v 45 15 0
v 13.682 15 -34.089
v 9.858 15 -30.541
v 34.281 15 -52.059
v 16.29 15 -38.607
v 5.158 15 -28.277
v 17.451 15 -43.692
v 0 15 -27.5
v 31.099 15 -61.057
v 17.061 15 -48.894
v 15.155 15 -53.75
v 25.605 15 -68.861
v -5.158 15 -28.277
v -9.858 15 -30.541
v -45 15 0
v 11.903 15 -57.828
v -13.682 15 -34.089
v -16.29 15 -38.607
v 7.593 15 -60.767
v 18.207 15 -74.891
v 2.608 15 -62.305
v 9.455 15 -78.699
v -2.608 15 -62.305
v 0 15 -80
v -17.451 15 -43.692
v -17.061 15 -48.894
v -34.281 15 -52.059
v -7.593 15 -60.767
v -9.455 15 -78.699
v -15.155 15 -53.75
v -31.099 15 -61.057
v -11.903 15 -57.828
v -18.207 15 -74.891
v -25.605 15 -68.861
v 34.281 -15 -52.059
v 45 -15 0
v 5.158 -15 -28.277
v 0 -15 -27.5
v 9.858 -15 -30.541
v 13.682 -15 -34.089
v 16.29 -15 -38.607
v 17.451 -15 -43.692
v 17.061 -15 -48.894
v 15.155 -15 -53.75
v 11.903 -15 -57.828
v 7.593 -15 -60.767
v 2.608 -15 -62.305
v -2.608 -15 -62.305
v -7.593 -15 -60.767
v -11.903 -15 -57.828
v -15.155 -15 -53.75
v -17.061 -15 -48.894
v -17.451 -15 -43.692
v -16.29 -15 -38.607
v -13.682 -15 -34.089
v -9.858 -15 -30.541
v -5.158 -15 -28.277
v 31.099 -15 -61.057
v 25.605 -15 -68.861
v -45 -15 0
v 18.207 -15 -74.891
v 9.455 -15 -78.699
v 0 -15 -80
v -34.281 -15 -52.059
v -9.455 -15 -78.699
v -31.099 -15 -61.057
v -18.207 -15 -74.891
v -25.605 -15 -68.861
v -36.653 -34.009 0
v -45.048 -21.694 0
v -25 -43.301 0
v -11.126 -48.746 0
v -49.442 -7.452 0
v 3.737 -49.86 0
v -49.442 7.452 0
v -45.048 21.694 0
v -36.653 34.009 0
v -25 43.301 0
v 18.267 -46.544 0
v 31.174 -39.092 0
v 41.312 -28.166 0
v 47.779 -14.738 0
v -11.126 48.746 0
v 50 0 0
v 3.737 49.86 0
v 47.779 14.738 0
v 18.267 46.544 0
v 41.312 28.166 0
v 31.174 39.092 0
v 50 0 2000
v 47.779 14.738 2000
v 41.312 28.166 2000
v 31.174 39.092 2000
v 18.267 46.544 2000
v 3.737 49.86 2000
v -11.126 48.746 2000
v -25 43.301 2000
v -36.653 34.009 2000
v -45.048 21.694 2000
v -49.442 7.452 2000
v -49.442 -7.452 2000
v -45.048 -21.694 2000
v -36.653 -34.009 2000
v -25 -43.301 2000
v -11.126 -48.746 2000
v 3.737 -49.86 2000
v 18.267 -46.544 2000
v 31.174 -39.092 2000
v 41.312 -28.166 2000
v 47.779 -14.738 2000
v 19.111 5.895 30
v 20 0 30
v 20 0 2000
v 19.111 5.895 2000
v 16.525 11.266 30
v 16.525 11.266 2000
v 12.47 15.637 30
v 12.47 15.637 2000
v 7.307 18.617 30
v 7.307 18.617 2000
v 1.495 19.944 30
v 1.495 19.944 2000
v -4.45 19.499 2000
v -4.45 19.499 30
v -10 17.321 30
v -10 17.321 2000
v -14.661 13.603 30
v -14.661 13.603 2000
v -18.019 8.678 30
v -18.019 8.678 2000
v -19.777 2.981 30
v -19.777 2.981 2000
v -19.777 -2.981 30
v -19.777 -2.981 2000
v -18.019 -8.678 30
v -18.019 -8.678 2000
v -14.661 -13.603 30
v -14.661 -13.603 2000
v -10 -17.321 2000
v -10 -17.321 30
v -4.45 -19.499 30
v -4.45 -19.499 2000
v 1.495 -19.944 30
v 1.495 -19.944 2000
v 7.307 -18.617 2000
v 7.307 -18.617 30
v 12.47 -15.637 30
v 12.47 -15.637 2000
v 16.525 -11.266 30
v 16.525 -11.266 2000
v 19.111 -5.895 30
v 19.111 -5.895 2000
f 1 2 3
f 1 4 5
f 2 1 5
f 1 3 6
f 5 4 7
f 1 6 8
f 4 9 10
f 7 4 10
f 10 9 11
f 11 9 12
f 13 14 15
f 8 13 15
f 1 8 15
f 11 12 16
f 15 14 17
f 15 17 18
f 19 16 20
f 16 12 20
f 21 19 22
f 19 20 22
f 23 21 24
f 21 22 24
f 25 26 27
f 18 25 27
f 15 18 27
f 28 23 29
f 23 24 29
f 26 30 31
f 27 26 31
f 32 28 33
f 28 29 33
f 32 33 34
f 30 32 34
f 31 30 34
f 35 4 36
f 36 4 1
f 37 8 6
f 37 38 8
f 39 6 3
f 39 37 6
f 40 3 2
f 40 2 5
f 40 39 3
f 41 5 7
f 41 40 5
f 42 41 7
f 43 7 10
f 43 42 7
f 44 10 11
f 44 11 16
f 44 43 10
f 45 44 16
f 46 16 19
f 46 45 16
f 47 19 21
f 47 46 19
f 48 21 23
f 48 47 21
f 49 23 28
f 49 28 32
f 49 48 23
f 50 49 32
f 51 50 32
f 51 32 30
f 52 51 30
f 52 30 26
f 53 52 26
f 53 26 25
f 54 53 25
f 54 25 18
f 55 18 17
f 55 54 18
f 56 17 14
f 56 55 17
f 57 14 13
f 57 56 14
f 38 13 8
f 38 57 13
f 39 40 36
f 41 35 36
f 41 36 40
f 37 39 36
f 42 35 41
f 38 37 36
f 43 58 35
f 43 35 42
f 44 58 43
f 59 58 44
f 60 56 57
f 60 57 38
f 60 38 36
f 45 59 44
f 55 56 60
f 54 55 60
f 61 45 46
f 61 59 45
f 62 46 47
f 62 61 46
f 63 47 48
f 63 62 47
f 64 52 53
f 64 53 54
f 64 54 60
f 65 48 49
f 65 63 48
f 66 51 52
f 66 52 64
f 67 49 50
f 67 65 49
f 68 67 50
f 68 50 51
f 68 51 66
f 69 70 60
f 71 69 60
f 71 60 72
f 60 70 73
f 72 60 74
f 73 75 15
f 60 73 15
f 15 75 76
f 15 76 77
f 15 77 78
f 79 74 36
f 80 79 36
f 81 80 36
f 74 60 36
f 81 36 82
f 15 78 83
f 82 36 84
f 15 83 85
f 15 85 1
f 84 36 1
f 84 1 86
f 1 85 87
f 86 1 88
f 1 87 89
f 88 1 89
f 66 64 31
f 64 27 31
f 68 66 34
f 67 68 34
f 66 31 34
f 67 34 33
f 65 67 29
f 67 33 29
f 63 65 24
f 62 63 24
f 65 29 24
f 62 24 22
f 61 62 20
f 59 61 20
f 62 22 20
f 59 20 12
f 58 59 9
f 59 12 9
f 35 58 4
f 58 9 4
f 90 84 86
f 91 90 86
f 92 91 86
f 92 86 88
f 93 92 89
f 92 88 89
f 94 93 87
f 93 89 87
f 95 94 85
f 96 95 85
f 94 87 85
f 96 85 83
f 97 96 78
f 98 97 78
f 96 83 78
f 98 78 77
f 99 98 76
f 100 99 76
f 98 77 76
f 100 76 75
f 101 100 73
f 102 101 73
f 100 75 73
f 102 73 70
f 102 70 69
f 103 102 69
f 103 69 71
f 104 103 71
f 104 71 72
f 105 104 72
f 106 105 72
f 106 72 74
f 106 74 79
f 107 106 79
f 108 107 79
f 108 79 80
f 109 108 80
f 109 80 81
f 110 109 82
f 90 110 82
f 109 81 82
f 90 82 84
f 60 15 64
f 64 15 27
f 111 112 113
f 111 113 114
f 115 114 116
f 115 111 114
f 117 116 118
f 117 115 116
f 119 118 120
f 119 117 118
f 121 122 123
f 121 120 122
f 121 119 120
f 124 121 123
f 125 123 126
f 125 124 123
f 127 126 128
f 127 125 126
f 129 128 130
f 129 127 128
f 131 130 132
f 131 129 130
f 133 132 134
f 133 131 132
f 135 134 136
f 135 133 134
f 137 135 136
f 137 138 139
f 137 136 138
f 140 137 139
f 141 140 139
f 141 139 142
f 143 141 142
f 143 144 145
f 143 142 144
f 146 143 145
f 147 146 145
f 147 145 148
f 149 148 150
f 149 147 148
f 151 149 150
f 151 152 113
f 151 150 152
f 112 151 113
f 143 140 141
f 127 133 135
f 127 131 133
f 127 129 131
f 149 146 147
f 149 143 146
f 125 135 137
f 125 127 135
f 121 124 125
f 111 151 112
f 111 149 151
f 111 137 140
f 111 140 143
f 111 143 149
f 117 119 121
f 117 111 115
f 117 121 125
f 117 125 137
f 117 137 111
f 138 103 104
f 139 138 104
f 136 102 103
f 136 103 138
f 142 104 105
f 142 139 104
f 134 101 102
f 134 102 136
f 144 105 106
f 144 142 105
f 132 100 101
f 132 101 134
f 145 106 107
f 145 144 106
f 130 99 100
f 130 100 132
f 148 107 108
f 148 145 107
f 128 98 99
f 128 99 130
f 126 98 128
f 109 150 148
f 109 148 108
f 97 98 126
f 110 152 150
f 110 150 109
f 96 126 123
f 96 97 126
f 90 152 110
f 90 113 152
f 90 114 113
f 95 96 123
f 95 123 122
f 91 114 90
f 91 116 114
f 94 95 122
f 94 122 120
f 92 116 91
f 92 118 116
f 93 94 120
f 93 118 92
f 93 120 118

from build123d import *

# Parameters (mm, degrees)
SKETCH1_R           = 50
BOSS_EXTRUDE1_DEPTH = 2000
SHELL1_T            = -30
SKETCH2_R           = 17.5
BOSS_EXTRUDE2_DEPTH = 15


with BuildPart() as part:
    # Sketch1 → Boss-Extrude1 (new body)
    with BuildSketch(Plane.XY):
        Circle(SKETCH1_R)
    extrude(amount=BOSS_EXTRUDE1_DEPTH)

    # Shell1
    shell1_openings = [part.faces().sort_by_distance(p)[0] for p in [
        (0, 0, 2000),
    ]]
    offset(amount=SHELL1_T, openings=shell1_openings, kind=Kind.INTERSECTION)

    # Sketch2 → Boss-Extrude2 (add, symmetric)
    with BuildSketch(Plane(origin=(0, 0, 0), x_dir=(1, 0, 0), z_dir=(0, 1, 0))):
        with BuildLine():
            Line((-45, 0), (-34.28083908, 52.058616858))
            ThreePointArc((-34.28083908, 52.058616858), (0, 80), (34.28083908, 52.058616858))
            Line((34.28083908, 52.058616858), (45, 0))
            Line((45, 0), (-45, 0))
        make_face()
        with Locations(Location((0, 45, 0), (0, 0, 270))):
            Circle(SKETCH2_R, mode=Mode.SUBTRACT)
    extrude(amount=BOSS_EXTRUDE2_DEPTH, both=True)


solid = part.part
